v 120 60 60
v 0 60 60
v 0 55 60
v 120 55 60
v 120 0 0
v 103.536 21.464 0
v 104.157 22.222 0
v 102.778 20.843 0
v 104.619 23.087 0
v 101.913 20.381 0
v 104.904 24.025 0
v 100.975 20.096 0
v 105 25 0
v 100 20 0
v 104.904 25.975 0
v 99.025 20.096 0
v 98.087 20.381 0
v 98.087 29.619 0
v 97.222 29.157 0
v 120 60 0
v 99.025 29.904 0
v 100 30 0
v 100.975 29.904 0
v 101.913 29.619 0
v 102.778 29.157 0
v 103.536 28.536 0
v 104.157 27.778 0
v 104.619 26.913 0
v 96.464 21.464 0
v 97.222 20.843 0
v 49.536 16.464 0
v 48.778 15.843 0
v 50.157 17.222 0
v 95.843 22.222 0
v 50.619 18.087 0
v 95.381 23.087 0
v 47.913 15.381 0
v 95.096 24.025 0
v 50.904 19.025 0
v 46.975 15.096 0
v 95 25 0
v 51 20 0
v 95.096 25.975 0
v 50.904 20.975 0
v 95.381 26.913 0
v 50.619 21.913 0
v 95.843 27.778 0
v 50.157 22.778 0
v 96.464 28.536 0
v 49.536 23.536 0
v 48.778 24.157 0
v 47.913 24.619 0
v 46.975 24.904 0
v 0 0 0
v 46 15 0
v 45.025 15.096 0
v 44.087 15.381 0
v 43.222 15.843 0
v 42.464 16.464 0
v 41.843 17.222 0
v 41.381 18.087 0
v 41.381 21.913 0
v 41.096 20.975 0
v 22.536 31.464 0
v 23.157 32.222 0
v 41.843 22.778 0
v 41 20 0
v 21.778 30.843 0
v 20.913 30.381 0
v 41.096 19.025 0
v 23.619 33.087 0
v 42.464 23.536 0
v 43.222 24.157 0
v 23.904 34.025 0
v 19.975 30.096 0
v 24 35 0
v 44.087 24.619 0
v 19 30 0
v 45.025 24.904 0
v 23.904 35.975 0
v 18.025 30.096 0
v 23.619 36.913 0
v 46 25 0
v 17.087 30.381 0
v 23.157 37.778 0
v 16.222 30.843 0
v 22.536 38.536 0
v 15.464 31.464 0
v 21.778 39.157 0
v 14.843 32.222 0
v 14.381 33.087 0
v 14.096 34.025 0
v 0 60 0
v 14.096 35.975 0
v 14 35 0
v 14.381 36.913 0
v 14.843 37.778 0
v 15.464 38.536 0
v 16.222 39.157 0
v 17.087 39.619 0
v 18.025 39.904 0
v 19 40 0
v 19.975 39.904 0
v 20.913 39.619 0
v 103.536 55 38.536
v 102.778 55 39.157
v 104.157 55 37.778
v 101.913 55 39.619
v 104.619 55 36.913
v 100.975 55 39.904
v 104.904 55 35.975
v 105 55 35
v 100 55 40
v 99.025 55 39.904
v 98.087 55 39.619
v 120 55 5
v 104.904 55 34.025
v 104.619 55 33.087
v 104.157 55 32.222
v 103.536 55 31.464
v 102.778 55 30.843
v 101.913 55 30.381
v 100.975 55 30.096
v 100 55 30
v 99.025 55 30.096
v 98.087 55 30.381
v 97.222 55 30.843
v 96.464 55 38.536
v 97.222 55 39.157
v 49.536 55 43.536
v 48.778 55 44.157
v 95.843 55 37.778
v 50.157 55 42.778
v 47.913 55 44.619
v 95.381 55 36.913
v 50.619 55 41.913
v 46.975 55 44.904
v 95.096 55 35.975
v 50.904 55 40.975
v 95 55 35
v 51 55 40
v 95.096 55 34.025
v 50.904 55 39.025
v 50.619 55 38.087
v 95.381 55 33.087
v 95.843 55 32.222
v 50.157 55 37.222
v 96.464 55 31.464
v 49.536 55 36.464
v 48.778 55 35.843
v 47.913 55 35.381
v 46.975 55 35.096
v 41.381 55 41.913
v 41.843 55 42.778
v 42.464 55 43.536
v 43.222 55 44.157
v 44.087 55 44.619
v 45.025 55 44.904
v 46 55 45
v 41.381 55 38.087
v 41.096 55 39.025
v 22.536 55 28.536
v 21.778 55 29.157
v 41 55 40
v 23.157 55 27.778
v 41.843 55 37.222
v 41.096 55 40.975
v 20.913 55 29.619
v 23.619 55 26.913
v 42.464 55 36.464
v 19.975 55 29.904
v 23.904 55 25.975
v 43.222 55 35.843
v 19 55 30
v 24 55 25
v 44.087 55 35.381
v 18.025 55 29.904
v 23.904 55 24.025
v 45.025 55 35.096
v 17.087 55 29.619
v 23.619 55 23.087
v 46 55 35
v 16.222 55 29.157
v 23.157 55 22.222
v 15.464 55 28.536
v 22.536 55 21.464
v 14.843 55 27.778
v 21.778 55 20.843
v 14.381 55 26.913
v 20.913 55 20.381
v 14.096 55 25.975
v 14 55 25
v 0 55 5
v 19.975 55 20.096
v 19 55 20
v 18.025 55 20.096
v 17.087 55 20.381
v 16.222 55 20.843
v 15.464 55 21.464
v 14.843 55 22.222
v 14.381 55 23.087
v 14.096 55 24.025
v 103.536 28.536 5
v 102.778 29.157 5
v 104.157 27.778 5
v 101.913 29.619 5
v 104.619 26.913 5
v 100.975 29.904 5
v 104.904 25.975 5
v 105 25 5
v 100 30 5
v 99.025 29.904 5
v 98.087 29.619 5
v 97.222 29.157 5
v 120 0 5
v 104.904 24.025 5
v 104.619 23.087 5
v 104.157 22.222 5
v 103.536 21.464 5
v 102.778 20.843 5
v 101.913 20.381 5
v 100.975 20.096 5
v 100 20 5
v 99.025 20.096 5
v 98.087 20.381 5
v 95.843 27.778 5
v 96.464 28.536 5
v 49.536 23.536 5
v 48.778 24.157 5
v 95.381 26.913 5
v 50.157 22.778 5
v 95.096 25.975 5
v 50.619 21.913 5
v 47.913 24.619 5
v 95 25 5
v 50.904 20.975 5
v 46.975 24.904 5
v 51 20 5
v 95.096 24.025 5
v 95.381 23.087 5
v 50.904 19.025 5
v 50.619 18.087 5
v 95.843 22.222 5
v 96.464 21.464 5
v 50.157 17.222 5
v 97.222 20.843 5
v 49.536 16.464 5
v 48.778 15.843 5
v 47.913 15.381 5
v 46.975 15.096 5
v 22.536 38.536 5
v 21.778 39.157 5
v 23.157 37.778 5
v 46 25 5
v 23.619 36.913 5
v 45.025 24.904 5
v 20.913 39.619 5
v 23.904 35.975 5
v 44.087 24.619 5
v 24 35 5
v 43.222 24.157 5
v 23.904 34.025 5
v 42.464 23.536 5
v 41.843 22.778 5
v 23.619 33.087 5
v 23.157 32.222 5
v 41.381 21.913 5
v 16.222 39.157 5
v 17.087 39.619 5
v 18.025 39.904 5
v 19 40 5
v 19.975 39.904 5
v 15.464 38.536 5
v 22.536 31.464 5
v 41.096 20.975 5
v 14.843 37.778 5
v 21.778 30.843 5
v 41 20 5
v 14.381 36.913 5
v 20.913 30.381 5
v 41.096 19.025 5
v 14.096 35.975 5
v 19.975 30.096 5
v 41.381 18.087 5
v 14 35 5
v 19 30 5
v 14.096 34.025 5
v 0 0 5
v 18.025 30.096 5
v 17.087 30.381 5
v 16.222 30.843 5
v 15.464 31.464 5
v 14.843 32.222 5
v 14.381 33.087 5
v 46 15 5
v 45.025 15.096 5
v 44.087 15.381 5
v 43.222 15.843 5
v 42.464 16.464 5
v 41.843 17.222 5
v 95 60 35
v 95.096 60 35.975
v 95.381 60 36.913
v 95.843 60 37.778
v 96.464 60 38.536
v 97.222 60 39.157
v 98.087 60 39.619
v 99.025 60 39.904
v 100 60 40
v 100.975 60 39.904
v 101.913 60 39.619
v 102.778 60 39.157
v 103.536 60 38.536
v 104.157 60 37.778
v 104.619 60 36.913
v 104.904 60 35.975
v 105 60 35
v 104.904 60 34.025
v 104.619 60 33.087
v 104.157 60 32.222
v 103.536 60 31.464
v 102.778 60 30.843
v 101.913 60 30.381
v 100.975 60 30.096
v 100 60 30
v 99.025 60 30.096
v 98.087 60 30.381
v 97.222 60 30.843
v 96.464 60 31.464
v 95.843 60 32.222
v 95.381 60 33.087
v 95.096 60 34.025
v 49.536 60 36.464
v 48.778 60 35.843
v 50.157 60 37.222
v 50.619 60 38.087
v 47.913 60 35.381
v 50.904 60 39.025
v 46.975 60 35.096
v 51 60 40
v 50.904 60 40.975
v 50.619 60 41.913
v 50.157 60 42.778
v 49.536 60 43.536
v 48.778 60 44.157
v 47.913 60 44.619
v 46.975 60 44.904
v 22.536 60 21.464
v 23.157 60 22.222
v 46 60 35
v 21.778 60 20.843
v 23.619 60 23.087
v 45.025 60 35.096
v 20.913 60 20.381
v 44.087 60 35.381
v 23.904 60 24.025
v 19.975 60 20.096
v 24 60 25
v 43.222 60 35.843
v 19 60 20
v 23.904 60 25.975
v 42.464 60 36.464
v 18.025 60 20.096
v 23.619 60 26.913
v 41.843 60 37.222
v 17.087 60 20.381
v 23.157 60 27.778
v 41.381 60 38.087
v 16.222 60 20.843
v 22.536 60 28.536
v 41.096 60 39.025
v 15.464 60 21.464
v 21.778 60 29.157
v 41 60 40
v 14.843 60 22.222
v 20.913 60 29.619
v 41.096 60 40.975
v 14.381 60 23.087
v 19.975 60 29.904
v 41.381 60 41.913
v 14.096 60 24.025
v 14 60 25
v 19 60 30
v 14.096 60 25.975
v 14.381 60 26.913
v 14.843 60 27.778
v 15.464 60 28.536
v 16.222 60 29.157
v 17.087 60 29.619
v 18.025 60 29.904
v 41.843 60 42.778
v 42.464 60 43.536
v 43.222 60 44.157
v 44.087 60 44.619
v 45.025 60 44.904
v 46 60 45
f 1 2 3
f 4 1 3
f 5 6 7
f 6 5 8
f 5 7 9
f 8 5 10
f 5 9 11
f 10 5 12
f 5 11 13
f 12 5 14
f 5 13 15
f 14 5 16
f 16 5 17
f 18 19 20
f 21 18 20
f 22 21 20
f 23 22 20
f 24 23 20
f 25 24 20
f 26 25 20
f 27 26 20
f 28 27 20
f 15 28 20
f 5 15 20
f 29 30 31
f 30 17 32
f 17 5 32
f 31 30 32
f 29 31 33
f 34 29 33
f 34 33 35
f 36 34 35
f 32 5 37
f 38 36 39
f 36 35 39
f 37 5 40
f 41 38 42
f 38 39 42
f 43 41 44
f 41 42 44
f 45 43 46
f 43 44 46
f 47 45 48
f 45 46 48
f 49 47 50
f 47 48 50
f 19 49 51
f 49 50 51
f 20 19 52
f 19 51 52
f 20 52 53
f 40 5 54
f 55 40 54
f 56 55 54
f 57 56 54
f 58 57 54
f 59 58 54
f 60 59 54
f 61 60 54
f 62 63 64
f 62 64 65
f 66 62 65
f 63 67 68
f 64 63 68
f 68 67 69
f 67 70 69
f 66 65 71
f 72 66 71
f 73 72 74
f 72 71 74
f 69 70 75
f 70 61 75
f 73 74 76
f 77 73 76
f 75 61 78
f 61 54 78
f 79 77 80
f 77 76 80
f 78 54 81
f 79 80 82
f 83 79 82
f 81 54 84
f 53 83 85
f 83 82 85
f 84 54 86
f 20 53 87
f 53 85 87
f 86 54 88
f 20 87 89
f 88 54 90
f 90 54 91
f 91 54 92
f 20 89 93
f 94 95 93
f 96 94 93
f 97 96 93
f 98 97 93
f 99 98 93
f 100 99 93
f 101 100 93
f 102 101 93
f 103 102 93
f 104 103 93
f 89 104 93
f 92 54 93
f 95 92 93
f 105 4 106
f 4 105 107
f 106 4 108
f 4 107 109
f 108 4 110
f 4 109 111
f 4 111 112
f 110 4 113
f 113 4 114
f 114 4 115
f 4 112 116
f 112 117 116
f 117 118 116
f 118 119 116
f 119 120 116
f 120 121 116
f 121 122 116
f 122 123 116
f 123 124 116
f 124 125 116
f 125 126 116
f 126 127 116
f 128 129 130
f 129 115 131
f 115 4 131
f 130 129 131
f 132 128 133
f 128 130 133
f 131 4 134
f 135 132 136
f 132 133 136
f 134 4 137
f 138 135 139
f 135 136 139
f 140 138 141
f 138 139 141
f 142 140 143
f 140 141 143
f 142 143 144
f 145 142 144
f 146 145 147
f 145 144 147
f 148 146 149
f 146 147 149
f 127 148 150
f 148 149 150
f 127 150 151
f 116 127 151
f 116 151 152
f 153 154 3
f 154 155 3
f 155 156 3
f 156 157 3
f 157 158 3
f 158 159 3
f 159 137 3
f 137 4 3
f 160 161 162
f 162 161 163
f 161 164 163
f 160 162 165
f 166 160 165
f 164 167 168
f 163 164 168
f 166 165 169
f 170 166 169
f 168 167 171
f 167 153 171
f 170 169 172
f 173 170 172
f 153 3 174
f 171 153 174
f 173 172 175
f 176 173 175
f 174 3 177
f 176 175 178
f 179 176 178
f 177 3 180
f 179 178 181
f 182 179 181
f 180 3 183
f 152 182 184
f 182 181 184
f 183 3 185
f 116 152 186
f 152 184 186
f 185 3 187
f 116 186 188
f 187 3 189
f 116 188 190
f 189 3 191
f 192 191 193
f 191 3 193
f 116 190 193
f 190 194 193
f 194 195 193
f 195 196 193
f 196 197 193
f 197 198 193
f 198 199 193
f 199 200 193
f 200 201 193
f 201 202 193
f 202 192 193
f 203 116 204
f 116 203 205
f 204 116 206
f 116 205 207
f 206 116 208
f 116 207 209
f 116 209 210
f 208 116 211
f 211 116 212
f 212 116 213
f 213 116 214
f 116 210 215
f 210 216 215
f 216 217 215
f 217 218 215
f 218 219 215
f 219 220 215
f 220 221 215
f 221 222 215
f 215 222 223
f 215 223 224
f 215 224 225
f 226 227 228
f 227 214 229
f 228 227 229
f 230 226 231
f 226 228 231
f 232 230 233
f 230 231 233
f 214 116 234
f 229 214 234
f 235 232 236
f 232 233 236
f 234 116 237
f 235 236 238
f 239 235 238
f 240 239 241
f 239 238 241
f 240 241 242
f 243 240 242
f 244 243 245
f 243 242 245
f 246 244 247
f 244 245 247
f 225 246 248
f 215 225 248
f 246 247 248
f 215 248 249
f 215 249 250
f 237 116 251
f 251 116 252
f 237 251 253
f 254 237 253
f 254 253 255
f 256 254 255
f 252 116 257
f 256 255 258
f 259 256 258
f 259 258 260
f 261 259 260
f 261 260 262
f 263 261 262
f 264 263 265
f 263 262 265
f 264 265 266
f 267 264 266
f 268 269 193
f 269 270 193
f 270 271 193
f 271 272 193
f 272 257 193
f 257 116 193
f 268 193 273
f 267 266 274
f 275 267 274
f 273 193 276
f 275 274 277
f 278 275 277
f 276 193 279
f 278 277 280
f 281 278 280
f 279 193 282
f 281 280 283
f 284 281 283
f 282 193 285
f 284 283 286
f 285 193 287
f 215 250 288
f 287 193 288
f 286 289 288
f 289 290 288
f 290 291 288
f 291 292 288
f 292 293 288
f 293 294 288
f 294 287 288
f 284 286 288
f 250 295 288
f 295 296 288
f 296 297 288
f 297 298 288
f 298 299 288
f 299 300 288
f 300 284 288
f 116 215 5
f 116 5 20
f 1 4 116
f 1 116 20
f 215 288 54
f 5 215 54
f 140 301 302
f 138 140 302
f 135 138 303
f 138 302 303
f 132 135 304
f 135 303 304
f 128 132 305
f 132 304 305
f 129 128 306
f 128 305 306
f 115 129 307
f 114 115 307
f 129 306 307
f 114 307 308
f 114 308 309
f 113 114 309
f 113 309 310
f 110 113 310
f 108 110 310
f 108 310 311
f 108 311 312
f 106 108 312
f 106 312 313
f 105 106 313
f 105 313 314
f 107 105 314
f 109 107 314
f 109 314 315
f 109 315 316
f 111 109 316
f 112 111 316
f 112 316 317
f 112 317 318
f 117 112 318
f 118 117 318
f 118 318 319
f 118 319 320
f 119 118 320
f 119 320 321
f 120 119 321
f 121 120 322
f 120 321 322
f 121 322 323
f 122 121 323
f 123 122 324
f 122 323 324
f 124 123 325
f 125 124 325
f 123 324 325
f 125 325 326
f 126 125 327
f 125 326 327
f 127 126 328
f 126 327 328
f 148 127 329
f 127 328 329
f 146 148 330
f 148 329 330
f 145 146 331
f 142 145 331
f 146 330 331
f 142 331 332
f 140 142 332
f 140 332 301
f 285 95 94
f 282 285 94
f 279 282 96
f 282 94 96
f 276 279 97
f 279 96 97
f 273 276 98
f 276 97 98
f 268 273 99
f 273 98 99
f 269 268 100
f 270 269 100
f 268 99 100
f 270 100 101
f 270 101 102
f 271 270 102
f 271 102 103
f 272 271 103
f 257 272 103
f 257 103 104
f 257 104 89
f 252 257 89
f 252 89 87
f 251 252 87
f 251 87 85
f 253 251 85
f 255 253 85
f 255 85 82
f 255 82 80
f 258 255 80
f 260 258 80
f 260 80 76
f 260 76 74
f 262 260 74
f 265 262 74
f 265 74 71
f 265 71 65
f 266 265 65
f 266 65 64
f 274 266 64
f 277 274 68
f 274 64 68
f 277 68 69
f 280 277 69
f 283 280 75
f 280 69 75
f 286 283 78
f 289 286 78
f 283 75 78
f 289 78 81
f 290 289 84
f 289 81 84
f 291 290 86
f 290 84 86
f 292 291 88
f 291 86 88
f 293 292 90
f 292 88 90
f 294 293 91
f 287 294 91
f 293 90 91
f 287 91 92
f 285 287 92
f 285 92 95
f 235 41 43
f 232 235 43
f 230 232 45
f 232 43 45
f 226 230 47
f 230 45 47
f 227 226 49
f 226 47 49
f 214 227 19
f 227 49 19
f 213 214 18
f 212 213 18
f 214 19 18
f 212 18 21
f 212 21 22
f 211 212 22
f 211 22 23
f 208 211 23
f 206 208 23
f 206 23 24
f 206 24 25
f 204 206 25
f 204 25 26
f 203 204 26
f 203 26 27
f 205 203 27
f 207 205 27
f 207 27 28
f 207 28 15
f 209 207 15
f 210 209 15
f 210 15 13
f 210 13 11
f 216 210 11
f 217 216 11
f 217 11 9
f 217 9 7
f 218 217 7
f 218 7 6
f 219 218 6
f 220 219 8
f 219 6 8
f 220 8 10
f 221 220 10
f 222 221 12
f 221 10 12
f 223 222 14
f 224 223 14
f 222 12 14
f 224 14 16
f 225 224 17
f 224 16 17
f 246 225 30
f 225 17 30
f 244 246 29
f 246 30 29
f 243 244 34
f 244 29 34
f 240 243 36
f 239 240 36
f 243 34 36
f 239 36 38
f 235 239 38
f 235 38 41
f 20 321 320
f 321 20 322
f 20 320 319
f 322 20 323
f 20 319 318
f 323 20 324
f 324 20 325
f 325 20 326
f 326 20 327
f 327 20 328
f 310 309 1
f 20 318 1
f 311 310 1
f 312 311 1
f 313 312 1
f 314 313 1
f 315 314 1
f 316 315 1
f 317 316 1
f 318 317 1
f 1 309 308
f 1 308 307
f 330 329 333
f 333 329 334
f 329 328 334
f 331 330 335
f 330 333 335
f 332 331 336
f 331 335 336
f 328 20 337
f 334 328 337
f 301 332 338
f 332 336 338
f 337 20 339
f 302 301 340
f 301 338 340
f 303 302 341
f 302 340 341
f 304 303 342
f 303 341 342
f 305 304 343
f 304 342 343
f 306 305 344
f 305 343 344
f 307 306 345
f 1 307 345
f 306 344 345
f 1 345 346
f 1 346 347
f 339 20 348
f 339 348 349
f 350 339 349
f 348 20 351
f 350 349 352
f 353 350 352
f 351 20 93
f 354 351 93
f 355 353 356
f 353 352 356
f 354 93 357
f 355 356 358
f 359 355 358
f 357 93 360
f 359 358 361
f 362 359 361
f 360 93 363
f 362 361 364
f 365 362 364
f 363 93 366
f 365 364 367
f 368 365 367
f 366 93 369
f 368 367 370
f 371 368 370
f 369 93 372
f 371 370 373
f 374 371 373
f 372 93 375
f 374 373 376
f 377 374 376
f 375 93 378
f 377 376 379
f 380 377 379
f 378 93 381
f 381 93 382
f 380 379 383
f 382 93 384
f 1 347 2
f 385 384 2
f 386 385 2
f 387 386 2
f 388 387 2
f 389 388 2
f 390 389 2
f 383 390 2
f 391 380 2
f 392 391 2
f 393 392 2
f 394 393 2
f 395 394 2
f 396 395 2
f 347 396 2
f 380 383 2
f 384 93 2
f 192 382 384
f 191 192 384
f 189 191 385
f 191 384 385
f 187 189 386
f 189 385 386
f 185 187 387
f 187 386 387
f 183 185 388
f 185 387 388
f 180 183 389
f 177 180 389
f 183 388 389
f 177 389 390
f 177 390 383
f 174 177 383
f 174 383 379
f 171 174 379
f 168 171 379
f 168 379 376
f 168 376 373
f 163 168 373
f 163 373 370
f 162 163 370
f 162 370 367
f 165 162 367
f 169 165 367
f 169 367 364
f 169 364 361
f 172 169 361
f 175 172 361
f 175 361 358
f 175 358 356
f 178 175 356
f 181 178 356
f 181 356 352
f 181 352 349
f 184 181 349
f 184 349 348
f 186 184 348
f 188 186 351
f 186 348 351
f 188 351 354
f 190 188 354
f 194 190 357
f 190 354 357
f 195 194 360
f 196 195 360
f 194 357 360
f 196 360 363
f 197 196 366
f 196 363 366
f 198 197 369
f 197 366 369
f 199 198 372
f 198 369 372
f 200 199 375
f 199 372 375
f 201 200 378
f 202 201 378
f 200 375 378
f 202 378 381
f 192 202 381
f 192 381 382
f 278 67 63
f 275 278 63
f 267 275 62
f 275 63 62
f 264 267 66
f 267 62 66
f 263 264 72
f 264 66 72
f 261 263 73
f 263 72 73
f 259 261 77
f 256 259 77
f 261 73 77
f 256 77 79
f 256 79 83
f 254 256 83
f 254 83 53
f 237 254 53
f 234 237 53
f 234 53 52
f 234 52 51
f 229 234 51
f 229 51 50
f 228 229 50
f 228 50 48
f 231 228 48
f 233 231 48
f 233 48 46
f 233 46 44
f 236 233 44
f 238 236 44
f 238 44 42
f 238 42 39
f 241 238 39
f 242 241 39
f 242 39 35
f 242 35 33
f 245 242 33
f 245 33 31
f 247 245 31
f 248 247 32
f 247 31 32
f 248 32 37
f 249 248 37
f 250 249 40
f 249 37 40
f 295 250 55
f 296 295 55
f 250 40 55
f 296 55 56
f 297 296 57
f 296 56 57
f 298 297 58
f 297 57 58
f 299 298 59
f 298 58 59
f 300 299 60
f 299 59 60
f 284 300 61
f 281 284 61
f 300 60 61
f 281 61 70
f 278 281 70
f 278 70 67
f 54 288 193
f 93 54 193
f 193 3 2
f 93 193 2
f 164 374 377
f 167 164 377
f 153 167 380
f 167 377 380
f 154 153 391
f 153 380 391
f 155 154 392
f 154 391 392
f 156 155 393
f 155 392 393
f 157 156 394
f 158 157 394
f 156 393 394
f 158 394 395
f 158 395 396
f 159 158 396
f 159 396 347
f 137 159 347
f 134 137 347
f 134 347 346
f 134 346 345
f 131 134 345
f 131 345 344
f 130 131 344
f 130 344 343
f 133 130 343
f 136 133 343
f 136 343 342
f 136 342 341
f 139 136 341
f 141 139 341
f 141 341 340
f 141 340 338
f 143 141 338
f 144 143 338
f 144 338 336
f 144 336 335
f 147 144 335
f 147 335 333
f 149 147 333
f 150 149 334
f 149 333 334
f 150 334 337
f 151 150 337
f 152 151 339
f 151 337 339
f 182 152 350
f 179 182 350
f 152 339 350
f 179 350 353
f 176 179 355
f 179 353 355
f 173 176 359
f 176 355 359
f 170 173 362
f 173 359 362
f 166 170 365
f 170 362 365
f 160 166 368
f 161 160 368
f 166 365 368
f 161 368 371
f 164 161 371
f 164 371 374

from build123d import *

# Parameters (mm, degrees)
F1_DEPTH   = 120
F4_D       = 10
F4_ON_F3_D = 10
F6_D       = 10
F8_D       = 10


with BuildPart() as f1:
    # F0 (on Right) → F1 (new body)
    with BuildSketch(Plane.YZ):
        Polygon((0, 5), (0, 0), (60, 0), (60, 60), (55, 60), (55, 5), align=None)
    extrude(amount=F1_DEPTH)

    # F4 (through all)
    with Locations(Plane.XY.offset(5)):
        with Locations((46, 20), (19, 35)):
            Hole(F4_D / 2)

    # F4 on F3 (through all)
    with Locations(Plane.XZ.offset(-55)):
        with Locations((46, 40), (19, 25)):
            Hole(F4_ON_F3_D / 2)

    # F6 (through all)
    with Locations(Plane.XZ.offset(-55)):
        with Locations((100, 35)):
            Hole(F6_D / 2)

    # F8 (through all)
    with Locations(Plane.XY.offset(5)):
        with Locations((100, 25)):
            Hole(F8_D / 2)


solid = f1.part
